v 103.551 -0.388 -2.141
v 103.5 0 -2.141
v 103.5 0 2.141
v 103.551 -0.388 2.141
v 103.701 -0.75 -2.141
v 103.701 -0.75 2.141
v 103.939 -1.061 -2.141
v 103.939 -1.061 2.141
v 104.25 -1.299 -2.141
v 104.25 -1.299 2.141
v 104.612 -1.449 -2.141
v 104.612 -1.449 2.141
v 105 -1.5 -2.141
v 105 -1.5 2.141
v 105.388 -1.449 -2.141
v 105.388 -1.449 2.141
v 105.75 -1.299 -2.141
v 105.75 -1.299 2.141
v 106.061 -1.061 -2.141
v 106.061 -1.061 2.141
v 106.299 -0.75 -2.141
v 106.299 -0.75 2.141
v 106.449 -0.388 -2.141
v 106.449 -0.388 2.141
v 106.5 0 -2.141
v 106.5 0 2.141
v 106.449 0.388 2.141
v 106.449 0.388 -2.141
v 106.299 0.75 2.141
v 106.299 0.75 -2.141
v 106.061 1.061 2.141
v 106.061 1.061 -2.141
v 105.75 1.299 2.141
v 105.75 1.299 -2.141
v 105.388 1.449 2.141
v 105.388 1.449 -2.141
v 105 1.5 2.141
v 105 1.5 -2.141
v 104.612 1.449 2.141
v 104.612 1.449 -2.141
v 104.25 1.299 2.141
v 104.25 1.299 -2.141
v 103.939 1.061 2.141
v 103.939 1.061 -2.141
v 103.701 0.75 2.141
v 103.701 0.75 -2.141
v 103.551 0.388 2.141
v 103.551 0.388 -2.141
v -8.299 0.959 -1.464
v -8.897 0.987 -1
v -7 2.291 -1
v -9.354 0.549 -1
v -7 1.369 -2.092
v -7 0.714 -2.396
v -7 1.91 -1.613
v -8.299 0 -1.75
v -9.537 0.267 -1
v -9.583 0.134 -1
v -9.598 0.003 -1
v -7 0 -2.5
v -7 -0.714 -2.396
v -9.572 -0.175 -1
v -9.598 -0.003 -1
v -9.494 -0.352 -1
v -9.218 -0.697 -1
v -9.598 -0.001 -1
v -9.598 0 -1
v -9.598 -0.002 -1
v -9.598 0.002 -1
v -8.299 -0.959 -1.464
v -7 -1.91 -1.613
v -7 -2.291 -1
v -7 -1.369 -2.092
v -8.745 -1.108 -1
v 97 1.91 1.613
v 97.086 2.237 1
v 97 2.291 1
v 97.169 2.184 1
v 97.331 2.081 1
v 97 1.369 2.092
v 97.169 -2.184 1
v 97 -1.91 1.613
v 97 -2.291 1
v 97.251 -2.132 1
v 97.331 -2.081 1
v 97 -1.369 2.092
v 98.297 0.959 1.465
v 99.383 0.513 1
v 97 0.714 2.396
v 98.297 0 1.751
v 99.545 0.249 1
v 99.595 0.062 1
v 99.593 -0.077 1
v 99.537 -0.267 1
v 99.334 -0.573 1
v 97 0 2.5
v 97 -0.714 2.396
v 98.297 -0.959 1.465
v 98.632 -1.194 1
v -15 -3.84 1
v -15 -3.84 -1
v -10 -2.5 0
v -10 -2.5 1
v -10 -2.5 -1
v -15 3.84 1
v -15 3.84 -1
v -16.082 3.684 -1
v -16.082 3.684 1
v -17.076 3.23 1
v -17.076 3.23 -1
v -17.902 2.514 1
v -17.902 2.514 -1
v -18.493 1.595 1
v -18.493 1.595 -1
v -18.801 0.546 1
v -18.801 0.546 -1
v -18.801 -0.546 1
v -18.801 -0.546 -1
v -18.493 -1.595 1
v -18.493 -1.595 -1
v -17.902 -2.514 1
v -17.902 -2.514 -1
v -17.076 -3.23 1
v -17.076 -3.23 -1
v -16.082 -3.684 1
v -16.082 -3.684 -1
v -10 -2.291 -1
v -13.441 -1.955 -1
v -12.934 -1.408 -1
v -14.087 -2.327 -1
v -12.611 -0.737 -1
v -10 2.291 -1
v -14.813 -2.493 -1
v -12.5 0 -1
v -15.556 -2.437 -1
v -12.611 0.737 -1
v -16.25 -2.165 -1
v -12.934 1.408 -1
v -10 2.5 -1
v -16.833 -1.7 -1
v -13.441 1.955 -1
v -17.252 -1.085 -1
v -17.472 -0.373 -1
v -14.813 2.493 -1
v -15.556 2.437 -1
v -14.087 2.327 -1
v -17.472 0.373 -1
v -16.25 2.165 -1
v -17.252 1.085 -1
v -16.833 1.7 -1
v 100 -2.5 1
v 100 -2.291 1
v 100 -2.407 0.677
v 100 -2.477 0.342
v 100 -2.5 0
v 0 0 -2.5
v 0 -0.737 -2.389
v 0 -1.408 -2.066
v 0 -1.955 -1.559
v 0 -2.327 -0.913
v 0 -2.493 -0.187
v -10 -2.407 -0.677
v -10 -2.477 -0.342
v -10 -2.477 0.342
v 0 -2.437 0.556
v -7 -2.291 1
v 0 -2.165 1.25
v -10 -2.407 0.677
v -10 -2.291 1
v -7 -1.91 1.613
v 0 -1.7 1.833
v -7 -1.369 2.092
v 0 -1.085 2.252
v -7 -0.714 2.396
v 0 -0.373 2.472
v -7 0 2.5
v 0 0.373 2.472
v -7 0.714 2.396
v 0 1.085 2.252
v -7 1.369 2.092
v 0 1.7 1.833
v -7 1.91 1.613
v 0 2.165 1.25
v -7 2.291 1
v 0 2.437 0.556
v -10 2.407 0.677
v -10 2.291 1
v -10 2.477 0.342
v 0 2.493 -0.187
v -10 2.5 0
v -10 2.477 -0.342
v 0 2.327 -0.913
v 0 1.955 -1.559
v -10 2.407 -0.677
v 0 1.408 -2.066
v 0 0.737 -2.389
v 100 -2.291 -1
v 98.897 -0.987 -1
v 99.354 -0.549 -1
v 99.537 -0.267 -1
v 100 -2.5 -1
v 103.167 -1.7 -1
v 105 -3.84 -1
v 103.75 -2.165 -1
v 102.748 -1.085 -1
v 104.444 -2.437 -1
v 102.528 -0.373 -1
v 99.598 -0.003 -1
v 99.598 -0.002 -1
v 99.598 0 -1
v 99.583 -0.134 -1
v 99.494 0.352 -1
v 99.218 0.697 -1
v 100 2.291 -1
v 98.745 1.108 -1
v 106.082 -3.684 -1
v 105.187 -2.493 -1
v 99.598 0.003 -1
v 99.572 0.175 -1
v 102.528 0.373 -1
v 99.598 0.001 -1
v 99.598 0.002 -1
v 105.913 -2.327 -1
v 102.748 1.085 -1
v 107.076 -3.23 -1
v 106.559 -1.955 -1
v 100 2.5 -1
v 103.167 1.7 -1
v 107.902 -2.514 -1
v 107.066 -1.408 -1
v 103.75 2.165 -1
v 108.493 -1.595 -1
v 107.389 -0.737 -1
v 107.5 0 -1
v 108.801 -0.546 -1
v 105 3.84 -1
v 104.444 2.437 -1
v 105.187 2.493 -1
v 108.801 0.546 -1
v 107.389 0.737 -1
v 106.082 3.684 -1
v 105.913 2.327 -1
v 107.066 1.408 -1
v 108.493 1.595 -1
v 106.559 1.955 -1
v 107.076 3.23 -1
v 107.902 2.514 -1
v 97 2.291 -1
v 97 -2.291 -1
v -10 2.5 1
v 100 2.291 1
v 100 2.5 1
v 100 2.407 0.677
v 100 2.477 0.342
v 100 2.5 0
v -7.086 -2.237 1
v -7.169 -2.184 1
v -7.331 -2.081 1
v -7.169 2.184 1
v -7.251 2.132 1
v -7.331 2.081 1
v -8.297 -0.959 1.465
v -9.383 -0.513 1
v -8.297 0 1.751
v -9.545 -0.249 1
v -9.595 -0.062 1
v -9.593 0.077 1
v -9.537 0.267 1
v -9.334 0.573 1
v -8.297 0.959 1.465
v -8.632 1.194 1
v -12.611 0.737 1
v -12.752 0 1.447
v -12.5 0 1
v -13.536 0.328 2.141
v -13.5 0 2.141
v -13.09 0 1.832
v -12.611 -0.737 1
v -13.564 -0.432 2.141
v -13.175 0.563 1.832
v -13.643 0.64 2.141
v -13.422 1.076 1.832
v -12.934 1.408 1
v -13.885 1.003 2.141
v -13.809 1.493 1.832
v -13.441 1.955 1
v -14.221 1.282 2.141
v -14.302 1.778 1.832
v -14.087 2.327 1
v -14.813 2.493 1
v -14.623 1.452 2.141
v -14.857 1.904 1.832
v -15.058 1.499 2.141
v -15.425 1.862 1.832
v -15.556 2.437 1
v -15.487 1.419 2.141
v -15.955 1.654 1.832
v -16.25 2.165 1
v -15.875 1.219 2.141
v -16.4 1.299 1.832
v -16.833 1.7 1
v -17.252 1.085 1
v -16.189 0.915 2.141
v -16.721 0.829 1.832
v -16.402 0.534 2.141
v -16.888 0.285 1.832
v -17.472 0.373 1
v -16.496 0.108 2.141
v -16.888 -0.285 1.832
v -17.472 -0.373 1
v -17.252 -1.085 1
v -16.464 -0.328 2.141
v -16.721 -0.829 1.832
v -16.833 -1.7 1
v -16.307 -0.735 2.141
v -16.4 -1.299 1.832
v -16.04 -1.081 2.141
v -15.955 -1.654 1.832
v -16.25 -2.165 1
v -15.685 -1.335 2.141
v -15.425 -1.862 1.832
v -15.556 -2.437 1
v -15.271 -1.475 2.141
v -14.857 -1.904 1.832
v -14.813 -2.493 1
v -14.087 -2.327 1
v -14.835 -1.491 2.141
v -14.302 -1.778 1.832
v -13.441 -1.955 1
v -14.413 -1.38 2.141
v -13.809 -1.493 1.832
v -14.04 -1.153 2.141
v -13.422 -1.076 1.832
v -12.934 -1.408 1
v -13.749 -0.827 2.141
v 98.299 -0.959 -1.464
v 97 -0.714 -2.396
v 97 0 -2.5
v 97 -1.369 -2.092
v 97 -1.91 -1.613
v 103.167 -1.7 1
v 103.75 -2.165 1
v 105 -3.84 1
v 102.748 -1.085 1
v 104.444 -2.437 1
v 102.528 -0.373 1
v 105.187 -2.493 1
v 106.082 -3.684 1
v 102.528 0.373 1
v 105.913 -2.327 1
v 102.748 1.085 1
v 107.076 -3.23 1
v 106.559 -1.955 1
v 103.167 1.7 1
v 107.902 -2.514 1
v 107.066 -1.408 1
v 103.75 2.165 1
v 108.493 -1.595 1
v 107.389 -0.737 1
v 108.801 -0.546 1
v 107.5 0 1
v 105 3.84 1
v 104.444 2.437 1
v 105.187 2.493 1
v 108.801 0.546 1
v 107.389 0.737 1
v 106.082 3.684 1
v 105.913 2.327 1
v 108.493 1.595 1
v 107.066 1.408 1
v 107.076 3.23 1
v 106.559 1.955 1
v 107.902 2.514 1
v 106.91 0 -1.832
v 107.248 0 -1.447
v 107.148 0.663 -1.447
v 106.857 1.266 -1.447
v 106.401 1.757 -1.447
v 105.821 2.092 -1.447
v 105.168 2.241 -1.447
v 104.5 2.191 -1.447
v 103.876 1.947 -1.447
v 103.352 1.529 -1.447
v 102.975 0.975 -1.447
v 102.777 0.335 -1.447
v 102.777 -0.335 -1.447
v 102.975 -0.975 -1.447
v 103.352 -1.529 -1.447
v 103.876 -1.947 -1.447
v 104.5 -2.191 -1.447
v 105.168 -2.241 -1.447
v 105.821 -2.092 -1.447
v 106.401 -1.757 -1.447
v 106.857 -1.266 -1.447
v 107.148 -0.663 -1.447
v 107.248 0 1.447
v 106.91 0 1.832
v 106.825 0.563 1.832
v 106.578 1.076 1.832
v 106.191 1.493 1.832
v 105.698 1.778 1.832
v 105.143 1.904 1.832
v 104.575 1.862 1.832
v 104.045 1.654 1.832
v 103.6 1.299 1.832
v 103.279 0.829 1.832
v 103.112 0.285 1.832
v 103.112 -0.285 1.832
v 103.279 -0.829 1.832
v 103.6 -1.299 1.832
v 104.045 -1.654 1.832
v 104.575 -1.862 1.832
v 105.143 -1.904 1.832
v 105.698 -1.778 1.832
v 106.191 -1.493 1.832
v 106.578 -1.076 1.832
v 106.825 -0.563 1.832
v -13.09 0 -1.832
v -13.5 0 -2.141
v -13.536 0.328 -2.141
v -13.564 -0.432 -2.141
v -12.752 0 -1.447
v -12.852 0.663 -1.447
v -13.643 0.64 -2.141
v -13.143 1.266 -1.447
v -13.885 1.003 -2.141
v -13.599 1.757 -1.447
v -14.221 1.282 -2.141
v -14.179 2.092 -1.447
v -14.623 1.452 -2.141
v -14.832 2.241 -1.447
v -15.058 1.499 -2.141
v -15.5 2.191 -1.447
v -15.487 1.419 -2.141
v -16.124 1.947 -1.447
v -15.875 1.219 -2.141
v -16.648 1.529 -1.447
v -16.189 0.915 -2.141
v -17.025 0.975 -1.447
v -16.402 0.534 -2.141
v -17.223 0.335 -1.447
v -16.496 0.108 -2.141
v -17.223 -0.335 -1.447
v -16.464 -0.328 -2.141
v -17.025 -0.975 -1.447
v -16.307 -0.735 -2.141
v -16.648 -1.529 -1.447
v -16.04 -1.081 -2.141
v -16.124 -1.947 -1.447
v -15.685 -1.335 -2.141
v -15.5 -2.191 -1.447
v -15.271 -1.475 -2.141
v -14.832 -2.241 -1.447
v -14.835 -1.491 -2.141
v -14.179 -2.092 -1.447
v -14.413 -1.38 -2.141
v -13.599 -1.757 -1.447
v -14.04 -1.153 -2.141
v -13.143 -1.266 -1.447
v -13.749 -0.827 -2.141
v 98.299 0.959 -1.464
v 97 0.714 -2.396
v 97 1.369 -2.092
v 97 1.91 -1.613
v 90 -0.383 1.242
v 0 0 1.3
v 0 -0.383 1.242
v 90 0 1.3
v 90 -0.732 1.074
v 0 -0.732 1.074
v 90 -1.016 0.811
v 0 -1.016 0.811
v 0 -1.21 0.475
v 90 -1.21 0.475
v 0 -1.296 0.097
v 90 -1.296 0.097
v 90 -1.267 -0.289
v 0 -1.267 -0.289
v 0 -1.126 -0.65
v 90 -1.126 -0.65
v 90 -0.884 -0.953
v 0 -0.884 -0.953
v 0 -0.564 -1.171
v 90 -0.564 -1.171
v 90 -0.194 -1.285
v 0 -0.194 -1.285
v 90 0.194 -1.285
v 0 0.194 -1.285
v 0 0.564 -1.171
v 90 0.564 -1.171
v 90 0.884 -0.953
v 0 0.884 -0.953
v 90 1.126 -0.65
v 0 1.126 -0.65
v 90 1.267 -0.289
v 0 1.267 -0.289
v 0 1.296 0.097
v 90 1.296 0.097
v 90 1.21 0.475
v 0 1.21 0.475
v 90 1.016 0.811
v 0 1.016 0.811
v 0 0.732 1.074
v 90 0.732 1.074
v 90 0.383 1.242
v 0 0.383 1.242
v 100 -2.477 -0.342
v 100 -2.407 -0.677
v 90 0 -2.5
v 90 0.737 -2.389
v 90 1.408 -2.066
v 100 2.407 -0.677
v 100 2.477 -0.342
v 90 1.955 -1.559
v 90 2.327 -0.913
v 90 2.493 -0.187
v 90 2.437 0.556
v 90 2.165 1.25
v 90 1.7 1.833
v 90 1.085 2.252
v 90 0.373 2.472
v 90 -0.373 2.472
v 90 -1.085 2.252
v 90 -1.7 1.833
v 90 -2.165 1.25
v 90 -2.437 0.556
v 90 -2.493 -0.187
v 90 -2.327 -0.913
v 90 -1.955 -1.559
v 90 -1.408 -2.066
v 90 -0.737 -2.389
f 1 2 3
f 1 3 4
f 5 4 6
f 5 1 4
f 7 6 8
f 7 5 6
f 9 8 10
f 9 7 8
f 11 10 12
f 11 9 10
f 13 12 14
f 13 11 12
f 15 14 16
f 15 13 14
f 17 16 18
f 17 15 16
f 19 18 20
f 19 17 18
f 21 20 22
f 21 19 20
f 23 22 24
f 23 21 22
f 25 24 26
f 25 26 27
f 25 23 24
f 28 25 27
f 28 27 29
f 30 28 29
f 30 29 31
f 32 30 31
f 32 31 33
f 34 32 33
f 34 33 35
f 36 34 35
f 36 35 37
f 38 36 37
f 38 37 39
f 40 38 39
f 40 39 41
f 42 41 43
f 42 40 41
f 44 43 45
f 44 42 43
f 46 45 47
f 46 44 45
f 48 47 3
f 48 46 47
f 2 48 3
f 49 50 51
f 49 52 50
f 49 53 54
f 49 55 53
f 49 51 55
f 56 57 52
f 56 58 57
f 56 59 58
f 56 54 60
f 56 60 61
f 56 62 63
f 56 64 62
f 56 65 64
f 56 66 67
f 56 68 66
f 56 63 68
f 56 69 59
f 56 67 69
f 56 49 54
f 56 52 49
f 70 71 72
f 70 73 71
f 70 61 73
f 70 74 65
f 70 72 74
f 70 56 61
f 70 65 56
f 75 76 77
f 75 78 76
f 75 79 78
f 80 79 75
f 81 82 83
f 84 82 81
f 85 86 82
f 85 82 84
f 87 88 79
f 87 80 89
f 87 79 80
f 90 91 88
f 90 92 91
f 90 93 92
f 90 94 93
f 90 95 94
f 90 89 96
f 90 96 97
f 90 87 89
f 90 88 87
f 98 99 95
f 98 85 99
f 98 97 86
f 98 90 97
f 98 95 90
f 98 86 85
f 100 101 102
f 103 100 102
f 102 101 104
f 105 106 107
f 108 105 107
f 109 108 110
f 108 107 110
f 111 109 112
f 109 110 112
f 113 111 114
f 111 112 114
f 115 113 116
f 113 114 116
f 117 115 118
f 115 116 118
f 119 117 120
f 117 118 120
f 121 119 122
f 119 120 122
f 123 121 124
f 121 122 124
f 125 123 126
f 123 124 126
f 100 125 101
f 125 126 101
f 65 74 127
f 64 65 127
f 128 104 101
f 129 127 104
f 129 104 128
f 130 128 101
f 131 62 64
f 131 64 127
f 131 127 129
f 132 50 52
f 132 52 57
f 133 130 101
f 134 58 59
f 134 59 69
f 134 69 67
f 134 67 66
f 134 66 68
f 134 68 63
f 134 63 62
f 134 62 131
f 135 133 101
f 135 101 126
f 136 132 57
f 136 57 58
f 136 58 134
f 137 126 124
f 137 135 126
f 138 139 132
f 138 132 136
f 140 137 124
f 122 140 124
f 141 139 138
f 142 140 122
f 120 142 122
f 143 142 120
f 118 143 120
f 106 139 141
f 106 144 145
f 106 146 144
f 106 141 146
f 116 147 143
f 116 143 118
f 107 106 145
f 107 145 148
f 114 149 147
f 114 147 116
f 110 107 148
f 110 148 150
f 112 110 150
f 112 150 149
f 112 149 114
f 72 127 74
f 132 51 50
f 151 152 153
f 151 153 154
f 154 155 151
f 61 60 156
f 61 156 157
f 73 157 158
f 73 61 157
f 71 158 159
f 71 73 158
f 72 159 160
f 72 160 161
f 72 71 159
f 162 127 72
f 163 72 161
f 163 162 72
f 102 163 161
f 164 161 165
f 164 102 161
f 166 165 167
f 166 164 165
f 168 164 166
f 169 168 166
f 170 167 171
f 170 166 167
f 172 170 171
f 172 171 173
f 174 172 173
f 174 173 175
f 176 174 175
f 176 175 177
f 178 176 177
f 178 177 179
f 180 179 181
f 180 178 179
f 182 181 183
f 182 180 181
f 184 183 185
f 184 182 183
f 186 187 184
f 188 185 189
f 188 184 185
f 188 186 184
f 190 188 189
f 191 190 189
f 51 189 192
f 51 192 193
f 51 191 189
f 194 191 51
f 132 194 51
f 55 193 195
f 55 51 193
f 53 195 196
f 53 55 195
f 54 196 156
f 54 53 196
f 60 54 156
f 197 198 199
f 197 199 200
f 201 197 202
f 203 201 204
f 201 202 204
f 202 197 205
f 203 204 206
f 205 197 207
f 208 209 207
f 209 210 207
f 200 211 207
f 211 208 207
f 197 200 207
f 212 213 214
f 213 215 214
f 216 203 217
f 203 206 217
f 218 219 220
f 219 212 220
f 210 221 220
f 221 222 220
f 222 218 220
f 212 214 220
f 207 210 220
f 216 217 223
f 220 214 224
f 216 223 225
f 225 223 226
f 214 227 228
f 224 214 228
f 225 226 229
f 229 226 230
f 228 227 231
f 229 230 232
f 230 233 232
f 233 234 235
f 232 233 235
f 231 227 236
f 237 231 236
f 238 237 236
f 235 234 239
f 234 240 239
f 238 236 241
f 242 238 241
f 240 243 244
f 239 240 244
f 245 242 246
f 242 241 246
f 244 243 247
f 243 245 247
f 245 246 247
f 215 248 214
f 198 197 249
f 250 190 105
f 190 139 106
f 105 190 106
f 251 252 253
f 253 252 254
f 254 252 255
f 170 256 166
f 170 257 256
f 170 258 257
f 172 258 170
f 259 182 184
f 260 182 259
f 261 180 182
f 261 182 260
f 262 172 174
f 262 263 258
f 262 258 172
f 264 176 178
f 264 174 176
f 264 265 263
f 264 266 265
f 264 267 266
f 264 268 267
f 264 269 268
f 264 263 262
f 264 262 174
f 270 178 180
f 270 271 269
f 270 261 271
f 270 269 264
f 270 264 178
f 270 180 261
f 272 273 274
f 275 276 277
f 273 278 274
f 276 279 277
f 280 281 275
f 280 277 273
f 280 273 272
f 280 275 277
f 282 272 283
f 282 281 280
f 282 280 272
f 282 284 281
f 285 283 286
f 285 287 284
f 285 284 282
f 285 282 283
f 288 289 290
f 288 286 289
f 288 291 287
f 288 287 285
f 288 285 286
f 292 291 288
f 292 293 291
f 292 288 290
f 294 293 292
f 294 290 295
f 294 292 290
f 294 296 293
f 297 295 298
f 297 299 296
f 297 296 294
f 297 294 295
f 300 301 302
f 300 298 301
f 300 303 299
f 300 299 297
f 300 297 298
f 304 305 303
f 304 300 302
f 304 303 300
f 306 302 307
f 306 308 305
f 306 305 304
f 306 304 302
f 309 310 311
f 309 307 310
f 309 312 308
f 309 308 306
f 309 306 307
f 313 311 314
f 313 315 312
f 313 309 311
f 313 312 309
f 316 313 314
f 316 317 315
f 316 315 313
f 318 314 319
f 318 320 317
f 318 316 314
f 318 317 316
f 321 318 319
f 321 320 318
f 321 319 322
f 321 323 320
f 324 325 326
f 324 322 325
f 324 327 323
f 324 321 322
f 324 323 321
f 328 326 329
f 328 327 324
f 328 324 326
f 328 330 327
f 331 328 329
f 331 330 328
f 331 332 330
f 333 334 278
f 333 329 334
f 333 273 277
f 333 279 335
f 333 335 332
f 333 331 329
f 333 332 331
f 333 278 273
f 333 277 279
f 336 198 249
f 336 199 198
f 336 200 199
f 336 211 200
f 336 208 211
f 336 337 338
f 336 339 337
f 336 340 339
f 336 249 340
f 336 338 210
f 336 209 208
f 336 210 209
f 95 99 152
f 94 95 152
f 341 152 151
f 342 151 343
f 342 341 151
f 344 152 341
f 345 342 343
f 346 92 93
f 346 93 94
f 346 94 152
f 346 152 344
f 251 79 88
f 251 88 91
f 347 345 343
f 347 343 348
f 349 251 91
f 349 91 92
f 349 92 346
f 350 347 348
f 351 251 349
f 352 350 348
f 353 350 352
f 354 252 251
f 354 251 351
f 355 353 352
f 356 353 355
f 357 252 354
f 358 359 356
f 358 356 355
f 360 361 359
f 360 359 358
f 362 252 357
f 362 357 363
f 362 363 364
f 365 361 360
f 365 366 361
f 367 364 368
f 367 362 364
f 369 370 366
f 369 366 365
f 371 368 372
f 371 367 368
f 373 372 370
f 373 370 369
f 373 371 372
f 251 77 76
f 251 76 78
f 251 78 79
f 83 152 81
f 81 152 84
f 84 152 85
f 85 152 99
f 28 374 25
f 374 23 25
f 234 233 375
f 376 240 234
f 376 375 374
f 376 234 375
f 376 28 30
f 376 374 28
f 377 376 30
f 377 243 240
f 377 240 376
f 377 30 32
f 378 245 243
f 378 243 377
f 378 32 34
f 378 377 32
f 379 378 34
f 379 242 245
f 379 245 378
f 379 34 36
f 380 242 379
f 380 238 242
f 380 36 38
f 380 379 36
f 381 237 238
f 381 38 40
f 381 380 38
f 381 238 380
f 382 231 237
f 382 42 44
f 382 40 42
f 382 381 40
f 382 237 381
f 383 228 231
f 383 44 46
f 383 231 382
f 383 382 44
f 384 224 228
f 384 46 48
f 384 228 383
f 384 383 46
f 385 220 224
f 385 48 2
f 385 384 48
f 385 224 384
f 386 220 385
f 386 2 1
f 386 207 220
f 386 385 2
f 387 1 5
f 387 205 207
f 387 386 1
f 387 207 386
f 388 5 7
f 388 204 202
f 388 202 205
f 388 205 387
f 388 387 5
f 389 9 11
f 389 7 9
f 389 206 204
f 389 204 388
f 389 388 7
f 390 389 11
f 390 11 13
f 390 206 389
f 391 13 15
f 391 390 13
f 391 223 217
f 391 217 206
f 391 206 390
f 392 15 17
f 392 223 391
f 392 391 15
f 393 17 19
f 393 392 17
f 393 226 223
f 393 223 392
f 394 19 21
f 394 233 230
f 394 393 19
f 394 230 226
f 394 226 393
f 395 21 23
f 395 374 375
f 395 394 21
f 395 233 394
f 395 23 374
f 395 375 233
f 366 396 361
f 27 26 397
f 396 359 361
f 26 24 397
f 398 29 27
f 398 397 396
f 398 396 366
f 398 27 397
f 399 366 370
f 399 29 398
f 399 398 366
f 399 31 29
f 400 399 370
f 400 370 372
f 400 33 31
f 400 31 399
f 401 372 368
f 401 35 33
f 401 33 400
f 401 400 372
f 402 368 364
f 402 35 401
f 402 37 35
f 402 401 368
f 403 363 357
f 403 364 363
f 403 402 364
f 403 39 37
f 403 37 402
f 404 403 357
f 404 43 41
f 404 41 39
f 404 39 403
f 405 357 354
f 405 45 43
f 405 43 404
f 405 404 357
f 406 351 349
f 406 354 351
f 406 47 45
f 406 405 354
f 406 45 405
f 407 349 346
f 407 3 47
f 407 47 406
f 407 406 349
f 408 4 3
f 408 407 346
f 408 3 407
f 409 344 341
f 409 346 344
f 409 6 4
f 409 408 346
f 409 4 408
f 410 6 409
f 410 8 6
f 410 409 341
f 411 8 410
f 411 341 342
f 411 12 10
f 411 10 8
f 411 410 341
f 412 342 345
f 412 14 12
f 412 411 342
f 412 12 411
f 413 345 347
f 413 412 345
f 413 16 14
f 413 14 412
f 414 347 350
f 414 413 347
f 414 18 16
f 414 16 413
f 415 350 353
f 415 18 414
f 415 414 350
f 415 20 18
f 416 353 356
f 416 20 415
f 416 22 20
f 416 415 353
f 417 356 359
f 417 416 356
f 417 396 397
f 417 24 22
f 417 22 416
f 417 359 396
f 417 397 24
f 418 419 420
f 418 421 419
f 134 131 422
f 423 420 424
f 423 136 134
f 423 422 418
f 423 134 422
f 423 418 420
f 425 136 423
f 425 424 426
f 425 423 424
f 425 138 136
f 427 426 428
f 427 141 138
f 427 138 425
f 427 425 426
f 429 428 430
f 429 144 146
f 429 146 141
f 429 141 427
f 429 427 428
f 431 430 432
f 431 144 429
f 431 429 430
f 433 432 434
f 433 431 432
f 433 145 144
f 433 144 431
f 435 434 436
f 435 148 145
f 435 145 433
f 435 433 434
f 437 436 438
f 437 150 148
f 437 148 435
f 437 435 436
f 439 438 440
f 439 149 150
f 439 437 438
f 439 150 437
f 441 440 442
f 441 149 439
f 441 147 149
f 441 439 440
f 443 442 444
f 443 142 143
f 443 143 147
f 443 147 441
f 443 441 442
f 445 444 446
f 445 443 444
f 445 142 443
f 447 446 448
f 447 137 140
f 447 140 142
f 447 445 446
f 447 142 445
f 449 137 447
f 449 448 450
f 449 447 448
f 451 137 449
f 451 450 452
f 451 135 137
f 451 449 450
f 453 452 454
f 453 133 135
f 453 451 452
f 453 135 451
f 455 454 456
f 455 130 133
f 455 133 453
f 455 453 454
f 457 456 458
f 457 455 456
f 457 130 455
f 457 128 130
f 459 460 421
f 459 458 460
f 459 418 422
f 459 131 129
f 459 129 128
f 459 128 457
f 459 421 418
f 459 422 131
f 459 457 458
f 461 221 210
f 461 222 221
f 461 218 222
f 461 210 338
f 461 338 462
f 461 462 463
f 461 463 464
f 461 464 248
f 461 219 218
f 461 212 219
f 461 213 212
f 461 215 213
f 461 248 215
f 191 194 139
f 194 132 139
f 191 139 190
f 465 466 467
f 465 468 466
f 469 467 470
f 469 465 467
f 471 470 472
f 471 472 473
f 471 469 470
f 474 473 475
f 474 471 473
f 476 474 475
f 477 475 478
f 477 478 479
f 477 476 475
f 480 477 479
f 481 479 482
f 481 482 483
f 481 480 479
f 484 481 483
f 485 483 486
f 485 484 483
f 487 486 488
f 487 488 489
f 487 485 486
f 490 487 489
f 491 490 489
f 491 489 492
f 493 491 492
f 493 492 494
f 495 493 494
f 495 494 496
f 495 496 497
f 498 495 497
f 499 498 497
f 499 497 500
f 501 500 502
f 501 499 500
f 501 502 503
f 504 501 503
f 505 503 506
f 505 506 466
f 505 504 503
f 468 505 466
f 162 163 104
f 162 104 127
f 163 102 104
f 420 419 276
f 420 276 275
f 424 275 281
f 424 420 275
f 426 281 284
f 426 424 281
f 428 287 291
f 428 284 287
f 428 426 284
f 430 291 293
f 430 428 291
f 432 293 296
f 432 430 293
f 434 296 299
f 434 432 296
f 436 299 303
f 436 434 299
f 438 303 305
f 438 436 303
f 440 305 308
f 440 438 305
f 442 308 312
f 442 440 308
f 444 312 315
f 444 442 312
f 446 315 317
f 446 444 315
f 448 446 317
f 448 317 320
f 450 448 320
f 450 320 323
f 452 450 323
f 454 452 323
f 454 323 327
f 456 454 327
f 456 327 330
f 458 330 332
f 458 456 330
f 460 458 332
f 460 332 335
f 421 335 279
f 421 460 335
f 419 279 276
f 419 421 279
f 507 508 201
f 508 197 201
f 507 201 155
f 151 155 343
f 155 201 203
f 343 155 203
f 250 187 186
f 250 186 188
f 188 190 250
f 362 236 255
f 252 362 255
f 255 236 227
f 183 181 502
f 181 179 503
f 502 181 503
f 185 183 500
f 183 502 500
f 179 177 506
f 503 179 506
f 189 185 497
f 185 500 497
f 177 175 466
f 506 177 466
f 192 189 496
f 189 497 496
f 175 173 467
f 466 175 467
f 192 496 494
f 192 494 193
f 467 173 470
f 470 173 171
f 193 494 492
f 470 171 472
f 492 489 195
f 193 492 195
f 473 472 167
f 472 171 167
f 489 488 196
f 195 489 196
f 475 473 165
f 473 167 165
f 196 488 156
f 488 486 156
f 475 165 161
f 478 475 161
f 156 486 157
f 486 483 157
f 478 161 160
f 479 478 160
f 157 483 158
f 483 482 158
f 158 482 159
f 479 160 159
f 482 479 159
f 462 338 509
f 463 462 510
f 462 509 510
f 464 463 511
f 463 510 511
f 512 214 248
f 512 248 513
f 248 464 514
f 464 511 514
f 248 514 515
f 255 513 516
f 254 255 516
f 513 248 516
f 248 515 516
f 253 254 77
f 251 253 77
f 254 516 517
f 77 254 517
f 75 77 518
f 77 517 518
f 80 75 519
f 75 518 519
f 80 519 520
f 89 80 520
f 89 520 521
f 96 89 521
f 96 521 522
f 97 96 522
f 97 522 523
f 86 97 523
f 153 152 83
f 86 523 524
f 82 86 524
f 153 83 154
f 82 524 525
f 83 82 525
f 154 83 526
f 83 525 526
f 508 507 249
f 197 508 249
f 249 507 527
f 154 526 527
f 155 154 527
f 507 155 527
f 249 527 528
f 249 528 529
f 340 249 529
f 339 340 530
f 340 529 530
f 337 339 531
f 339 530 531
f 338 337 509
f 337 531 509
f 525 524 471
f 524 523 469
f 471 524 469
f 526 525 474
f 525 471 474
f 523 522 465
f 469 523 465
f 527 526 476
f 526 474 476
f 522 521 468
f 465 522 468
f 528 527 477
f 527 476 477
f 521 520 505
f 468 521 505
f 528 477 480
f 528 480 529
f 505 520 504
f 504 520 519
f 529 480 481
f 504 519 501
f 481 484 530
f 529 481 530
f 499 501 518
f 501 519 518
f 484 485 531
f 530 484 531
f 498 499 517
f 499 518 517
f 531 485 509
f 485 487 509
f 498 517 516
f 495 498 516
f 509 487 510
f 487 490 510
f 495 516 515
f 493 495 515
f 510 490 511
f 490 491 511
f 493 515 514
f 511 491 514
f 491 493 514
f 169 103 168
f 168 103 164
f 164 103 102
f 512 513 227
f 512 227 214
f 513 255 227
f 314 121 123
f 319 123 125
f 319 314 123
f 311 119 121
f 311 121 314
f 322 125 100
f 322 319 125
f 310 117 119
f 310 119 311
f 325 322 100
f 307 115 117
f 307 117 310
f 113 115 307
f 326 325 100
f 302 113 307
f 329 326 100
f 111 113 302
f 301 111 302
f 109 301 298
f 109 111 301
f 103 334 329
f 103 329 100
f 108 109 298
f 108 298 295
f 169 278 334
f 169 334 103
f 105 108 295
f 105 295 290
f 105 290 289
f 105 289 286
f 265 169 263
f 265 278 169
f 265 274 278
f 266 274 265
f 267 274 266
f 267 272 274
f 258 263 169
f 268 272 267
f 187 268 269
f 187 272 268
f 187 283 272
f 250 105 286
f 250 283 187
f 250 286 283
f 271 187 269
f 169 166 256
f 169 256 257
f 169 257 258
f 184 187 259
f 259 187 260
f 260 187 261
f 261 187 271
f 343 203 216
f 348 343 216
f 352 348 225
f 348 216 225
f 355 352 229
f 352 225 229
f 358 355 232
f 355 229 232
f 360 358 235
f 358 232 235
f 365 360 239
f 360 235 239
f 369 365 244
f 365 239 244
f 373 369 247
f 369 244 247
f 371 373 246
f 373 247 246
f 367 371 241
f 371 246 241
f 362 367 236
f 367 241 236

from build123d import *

# Parameters (mm, degrees)
SKETCH_1_W               = 90
SKETCH_1_H               = 1.3
SKETCH_2_R               = 2.5
EXTRUDE_1_DEPTH          = 10
EXTRUDE_START            = 10
SKETCH_3_R               = 2.5
EXTRUDE_2_DEPTH          = 10
EXTRUDE_3_DEPTH          = 1
EXTRUDE_3_DEPTH_BACK     = 1
SKETCH_4_R               = 1.55
EXTRUDE_4_DEPTH          = 2.5
EXTRUDE_4_DEPTH_BACK     = 2.5
SKETCH_5_R               = 2.5
CHAMFER_1_SIZE           = 3
CHAMFER_1_SIZE_2         = 1.732050808
FILLET_1_R               = 2.5
CUT_EXTRUDE_1_DEPTH      = 109.936146208
CUT_EXTRUDE_1_DEPTH_BACK = 109.936146208
SKETCH_6_R               = 1.5


with BuildPart() as part:
    # 草图1 → 旋转1 (revolve)
    with BuildSketch(Plane.XY, mode=Mode.PRIVATE) as revolve_1_sk:
        with Locations((45, 0.65)):
            Rectangle(SKETCH_1_W, SKETCH_1_H)
    revolve(revolve_1_sk.sketch.rotate(Axis((0, 0, 0), (1, 0, 0)), 90), axis=Axis((0, 0, 0), (1, 0, 0)))

    # 草图2 → 凸台-拉伸1 (add)
    with BuildSketch(Plane(origin=(90, 0, 0), x_dir=(0, 0, -1), z_dir=(1, 0, 0))):
        Circle(SKETCH_2_R)
    extrude(amount=EXTRUDE_1_DEPTH)

    # 草图3 → 凸台-拉伸2 (add)
    with BuildSketch(Plane.ZY.offset(EXTRUDE_START)):
        with Locations(Location((0, 0, 0), (0, 0, 180))):
            Circle(SKETCH_3_R)
    extrude(amount=-EXTRUDE_2_DEPTH)

    # 草图4 → 凸台-拉伸3 (add, two sides: drawn at the far end of the back side and taken through both)
    # profile 1 of 2: a face of its own
    with BuildSketch(Plane.XY.offset(-EXTRUDE_3_DEPTH_BACK)):
        with BuildLine():
            Line((100, 2.5), (100, -2.5))
            Line((100, -2.5), (105, -3.839745962))
            ThreePointArc((105, -3.839745962), (108.839745962, 0), (105, 3.839745962))
            Line((105, 3.839745962), (100, 2.5))
        make_face()
        with Locations((105, 0)):
            Circle(SKETCH_4_R, mode=Mode.SUBTRACT)
    # profile 2 of 2: a face of its own
    with BuildSketch(Plane.XY.offset(-EXTRUDE_3_DEPTH_BACK)):
        with BuildLine():
            Line((-10, 2.5), (-15, 3.839745962))
            ThreePointArc((-15, 3.839745962), (-18.839745962, 0), (-15, -3.839745962))
            Line((-15, -3.839745962), (-10, -2.5))
            Line((-10, -2.5), (-10, 2.5))
        make_face()
        with Locations((-15, 0)):
            Circle(SKETCH_4_R, mode=Mode.SUBTRACT)
    extrude(amount=EXTRUDE_3_DEPTH + EXTRUDE_3_DEPTH_BACK)

    # 草图5 → 凸台-拉伸4 (add, two sides: drawn at the far end of the back side and taken through both)
    with BuildSketch(Plane.XY.offset(-EXTRUDE_4_DEPTH_BACK)):
        with Locations((105, 0)):
            Circle(SKETCH_5_R)
        with Locations((-15, 0)):
            Circle(SKETCH_5_R)
    extrude(amount=EXTRUDE_4_DEPTH + EXTRUDE_4_DEPTH_BACK)

    # 倒角1
    # the kernel refuses this chamfer: 3, 1.732050808 mm, written as the material it takes off along each edge
    with BuildSketch(Plane(origin=(100, 0, 0), x_dir=(0, 0, -1), z_dir=(0, -1, 0))) as chamfer_1_piece_1_section:
        Polygon((2.5, -CHAMFER_1_SIZE), (2.5 - CHAMFER_1_SIZE_2, 0), (2.5, 0), align=None)
    chamfer_1_piece_1 = revolve(axis=Axis((100, 0, 0), (1, 0, 0)), revolution_arc=244.335649535, mode=Mode.PRIVATE)
    chamfer_1_piece_1 = split(chamfer_1_piece_1, bisect_by=Plane(origin=(98.91025403, 0.96255065, -1), z_dir=(0, 0, -1)), keep=Keep.TOP, mode=Mode.PRIVATE)
    add(chamfer_1_piece_1, mode=Mode.SUBTRACT)
    with BuildSketch(Plane(origin=(100, 0, 0), x_dir=(0, 0, -1), z_dir=(0, -1, 0))) as chamfer_1_piece_2_section:
        Polygon((2.5, -CHAMFER_1_SIZE), (2.5 - CHAMFER_1_SIZE_2, 0), (2.5, 0), align=None)
    chamfer_1_piece_2 = revolve(axis=Axis((100, 0, 0), (1, 0, 0)), revolution_arc=244.335649535, mode=Mode.PRIVATE)
    chamfer_1_piece_2 = split(chamfer_1_piece_2, bisect_by=Plane(origin=(98.892055311, -0.028025322, 1), z_dir=(0, 0, 1)), keep=Keep.TOP, mode=Mode.PRIVATE)
    add(chamfer_1_piece_2, mode=Mode.SUBTRACT)
    with BuildSketch(Plane(origin=(100, 0, 0), x_dir=(0, 0.003141587485879368, -0.9999950652018581), z_dir=(0, -0.9999950652018581, -0.003141587485879368))) as chamfer_1_piece_3_section:
        Polygon((2.5, -CHAMFER_1_SIZE), (2.5 - CHAMFER_1_SIZE_2, 0), (2.5, 0), align=None)
    chamfer_1_piece_3 = revolve(axis=Axis((100, 0, 0), (1, 0, 0)), revolution_arc=359.64, mode=Mode.PRIVATE)
    chamfer_1_piece_3 = split(chamfer_1_piece_3, bisect_by=Plane(origin=(98.910233235, 0.965609903, -1), z_dir=(0, 0, -1)), keep=Keep.TOP, mode=Mode.PRIVATE)
    add(chamfer_1_piece_3, mode=Mode.SUBTRACT)
    with BuildSketch(Plane(origin=(100, 0, 0), x_dir=(0, 0.003141587485879368, -0.9999950652018581), z_dir=(0, -0.9999950652018581, -0.003141587485879368))) as chamfer_1_piece_4_section:
        Polygon((2.5, -CHAMFER_1_SIZE), (2.5 - CHAMFER_1_SIZE_2, 0), (2.5, 0), align=None)
    chamfer_1_piece_4 = revolve(axis=Axis((100, 0, 0), (1, 0, 0)), revolution_arc=359.64, mode=Mode.PRIVATE)
    chamfer_1_piece_4 = split(chamfer_1_piece_4, bisect_by=Plane(origin=(98.91025403, -2e-09, 1), z_dir=(0, 0, 1)), keep=Keep.TOP, mode=Mode.PRIVATE)
    add(chamfer_1_piece_4, mode=Mode.SUBTRACT)
    with BuildSketch(Plane(origin=(-10, 0, 0), x_dir=(0, 0, -1), z_dir=(0, 1, 0))) as chamfer_1_piece_5_section:
        Polygon((2.5, -CHAMFER_1_SIZE), (2.5 - CHAMFER_1_SIZE_2, 0), (2.5, 0), align=None)
    chamfer_1_piece_5 = revolve(axis=Axis((-10, 0, 0), (-1, 0, 0)), revolution_arc=244.335649535, mode=Mode.PRIVATE)
    chamfer_1_piece_5 = split(chamfer_1_piece_5, bisect_by=Plane(origin=(-8.91025403, -0.96255065, -1), z_dir=(0, 0, -1)), keep=Keep.TOP, mode=Mode.PRIVATE)
    add(chamfer_1_piece_5, mode=Mode.SUBTRACT)
    with BuildSketch(Plane(origin=(-10, 0, 0), x_dir=(0, 0, -1), z_dir=(0, 1, 0))) as chamfer_1_piece_6_section:
        Polygon((2.5, -CHAMFER_1_SIZE), (2.5 - CHAMFER_1_SIZE_2, 0), (2.5, 0), align=None)
    chamfer_1_piece_6 = revolve(axis=Axis((-10, 0, 0), (-1, 0, 0)), revolution_arc=244.335649535, mode=Mode.PRIVATE)
    chamfer_1_piece_6 = split(chamfer_1_piece_6, bisect_by=Plane(origin=(-8.892055311, 0.028025322, 1), z_dir=(0, 0, 1)), keep=Keep.TOP, mode=Mode.PRIVATE)
    add(chamfer_1_piece_6, mode=Mode.SUBTRACT)
    with BuildSketch(Plane(origin=(-10, 0, 0), x_dir=(0, -0.0031415874858794677, -0.9999950652018581), z_dir=(0, 0.9999950652018581, -0.0031415874858794677))) as chamfer_1_piece_7_section:
        Polygon((2.5, -CHAMFER_1_SIZE), (2.5 - CHAMFER_1_SIZE_2, 0), (2.5, 0), align=None)
    chamfer_1_piece_7 = revolve(axis=Axis((-10, 0, 0), (-1, 0, 0)), revolution_arc=359.64, mode=Mode.PRIVATE)
    chamfer_1_piece_7 = split(chamfer_1_piece_7, bisect_by=Plane(origin=(-8.910233235, -0.965609903, -1), z_dir=(0, 0, -1)), keep=Keep.TOP, mode=Mode.PRIVATE)
    add(chamfer_1_piece_7, mode=Mode.SUBTRACT)
    with BuildSketch(Plane(origin=(-10, 0, 0), x_dir=(0, -0.0031415874858794677, -0.9999950652018581), z_dir=(0, 0.9999950652018581, -0.0031415874858794677))) as chamfer_1_piece_8_section:
        Polygon((2.5, -CHAMFER_1_SIZE), (2.5 - CHAMFER_1_SIZE_2, 0), (2.5, 0), align=None)
    chamfer_1_piece_8 = revolve(axis=Axis((-10, 0, 0), (-1, 0, 0)), revolution_arc=359.64, mode=Mode.PRIVATE)
    chamfer_1_piece_8 = split(chamfer_1_piece_8, bisect_by=Plane(origin=(-8.91025403, 2e-09, 1), z_dir=(0, 0, 1)), keep=Keep.TOP, mode=Mode.PRIVATE)
    add(chamfer_1_piece_8, mode=Mode.SUBTRACT)
    with BuildSketch(Plane(origin=(-10, 0, 0), x_dir=(0, -0.901346670332976, 0.43309834896898114), z_dir=(0, -0.43309834896898114, -0.901346670332976))) as chamfer_1_piece_9_section:
        Polygon((2.5, -CHAMFER_1_SIZE), (2.5 - CHAMFER_1_SIZE_2, 0), (2.5, 0), align=None)
    chamfer_1_piece_9 = revolve(axis=Axis((-10, 0, 0), (-1, 0, 0)), revolution_arc=244.335649535, mode=Mode.PRIVATE)
    chamfer_1_piece_9 = split(chamfer_1_piece_9, bisect_by=Plane(origin=(-8.89205531, -0.028025322, 1), z_dir=(0, 0, 1)), keep=Keep.TOP, mode=Mode.PRIVATE)
    add(chamfer_1_piece_9, mode=Mode.SUBTRACT)
    with BuildSketch(Plane(origin=(-10, 0, 0), x_dir=(0, -0.901346670332976, 0.43309834896898114), z_dir=(0, -0.43309834896898114, -0.901346670332976))) as chamfer_1_piece_10_section:
        Polygon((2.5, -CHAMFER_1_SIZE), (2.5 - CHAMFER_1_SIZE_2, 0), (2.5, 0), align=None)
    chamfer_1_piece_10 = revolve(axis=Axis((-10, 0, 0), (-1, 0, 0)), revolution_arc=244.335649535, mode=Mode.PRIVATE)
    chamfer_1_piece_10 = split(chamfer_1_piece_10, bisect_by=Plane(origin=(-8.910254031, 0.96255065, -1), z_dir=(0, 0, -1)), keep=Keep.TOP, mode=Mode.PRIVATE)
    add(chamfer_1_piece_10, mode=Mode.SUBTRACT)
    with BuildSketch(Plane(origin=(100, 0, 0), x_dir=(0, 0.9013466703329771, 0.43309834896897925), z_dir=(0, 0.43309834896897925, -0.9013466703329771))) as chamfer_1_piece_11_section:
        Polygon((2.5, -CHAMFER_1_SIZE), (2.5 - CHAMFER_1_SIZE_2, 0), (2.5, 0), align=None)
    chamfer_1_piece_11 = revolve(axis=Axis((100, 0, 0), (1, 0, 0)), revolution_arc=244.335649535, mode=Mode.PRIVATE)
    chamfer_1_piece_11 = split(chamfer_1_piece_11, bisect_by=Plane(origin=(98.89205531, 0.028025322, 1), z_dir=(0, 0, 1)), keep=Keep.TOP, mode=Mode.PRIVATE)
    add(chamfer_1_piece_11, mode=Mode.SUBTRACT)
    with BuildSketch(Plane(origin=(100, 0, 0), x_dir=(0, 0.9013466703329771, 0.43309834896897925), z_dir=(0, 0.43309834896897925, -0.9013466703329771))) as chamfer_1_piece_12_section:
        Polygon((2.5, -CHAMFER_1_SIZE), (2.5 - CHAMFER_1_SIZE_2, 0), (2.5, 0), align=None)
    chamfer_1_piece_12 = revolve(axis=Axis((100, 0, 0), (1, 0, 0)), revolution_arc=244.335649535, mode=Mode.PRIVATE)
    chamfer_1_piece_12 = split(chamfer_1_piece_12, bisect_by=Plane(origin=(98.910254031, -0.96255065, -1), z_dir=(0, 0, -1)), keep=Keep.TOP, mode=Mode.PRIVATE)
    add(chamfer_1_piece_12, mode=Mode.SUBTRACT)

    # 圆角1
    # the kernel refuses this fillet: 2.5 mm, written as the material it takes off along each edge
    with BuildSketch(Plane(origin=(105, 0, -2.5), x_dir=(1, 0, 0), z_dir=(0, -1, 0))) as fillet_1_piece_1:
        with BuildLine():
            CenterArc((0.208712153, 2.5), FILLET_1_R, 270, 66.421821522)
            Line((0.208712153, 0), (0.208712153, -0.05))
            Line((0.208712153, -0.05), (2.5, -0.05))
            Line((2.5, -0.05), (2.55, 0))
            ThreePointArc((2.55, 0), (2.55, 0.75), (2.545825757, 1.48))
            Line((2.545825757, 1.48), (2.5, 1.5))
        make_face()
    revolve(axis=Axis((105, 0, -2.5), (0, 0, 1)), mode=Mode.SUBTRACT)
    with BuildSketch(Plane(origin=(105, 0, 2.5), x_dir=(1, 0, 0), z_dir=(0, -1, 0))) as fillet_1_piece_2:
        with BuildLine():
            CenterArc((0.208712153, -2.5), FILLET_1_R, 23.578178478, 66.421821522)
            Line((0.208712153, 0), (0.208712153, 0.05))
            Line((0.208712153, 0.05), (2.5, 0.05))
            Line((2.5, 0.05), (2.55, 0))
            ThreePointArc((2.55, 0), (2.55, -0.75), (2.545825757, -1.48))
            Line((2.545825757, -1.48), (2.5, -1.5))
        make_face()
    revolve(axis=Axis((105, 0, 2.5), (0, 0, 1)), mode=Mode.SUBTRACT)
    with BuildSketch(Plane(origin=(-15, 0, -2.5), x_dir=(1, 0, 0), z_dir=(0, -1, 0))) as fillet_1_piece_3:
        with BuildLine():
            CenterArc((0.208712153, 2.5), FILLET_1_R, 270, 66.421821522)
            Line((0.208712153, 0), (0.208712153, -0.05))
            Line((0.208712153, -0.05), (2.5, -0.05))
            Line((2.5, -0.05), (2.55, 0))
            ThreePointArc((2.55, 0), (2.55, 0.75), (2.545825757, 1.48))
            Line((2.545825757, 1.48), (2.5, 1.5))
        make_face()
    revolve(axis=Axis((-15, 0, -2.5), (0, 0, 1)), mode=Mode.SUBTRACT)
    with BuildSketch(Plane(origin=(-15, 0, 2.5), x_dir=(1, 0, 0), z_dir=(0, -1, 0))) as fillet_1_piece_4:
        with BuildLine():
            CenterArc((0.208712153, -2.5), FILLET_1_R, 23.578178478, 66.421821522)
            Line((0.208712153, 0), (0.208712153, 0.05))
            Line((0.208712153, 0.05), (2.5, 0.05))
            Line((2.5, 0.05), (2.55, 0))
            ThreePointArc((2.55, 0), (2.55, -0.75), (2.545825757, -1.48))
            Line((2.545825757, -1.48), (2.5, -1.5))
        make_face()
    revolve(axis=Axis((-15, 0, 2.5), (0, 0, 1)), mode=Mode.SUBTRACT)

    # 草图6 → 切除-拉伸1 (cut, two sides: drawn at the far end of the back side and taken through both)
    with BuildSketch(Plane.XY.offset(-CUT_EXTRUDE_1_DEPTH_BACK)):
        with Locations((-15, 0)):
            Circle(SKETCH_6_R)
        with Locations(Location((105, 0, 0), (0, 0, 180))):
            Circle(SKETCH_6_R)
    extrude(amount=CUT_EXTRUDE_1_DEPTH + CUT_EXTRUDE_1_DEPTH_BACK, mode=Mode.SUBTRACT)


solid = part.part
